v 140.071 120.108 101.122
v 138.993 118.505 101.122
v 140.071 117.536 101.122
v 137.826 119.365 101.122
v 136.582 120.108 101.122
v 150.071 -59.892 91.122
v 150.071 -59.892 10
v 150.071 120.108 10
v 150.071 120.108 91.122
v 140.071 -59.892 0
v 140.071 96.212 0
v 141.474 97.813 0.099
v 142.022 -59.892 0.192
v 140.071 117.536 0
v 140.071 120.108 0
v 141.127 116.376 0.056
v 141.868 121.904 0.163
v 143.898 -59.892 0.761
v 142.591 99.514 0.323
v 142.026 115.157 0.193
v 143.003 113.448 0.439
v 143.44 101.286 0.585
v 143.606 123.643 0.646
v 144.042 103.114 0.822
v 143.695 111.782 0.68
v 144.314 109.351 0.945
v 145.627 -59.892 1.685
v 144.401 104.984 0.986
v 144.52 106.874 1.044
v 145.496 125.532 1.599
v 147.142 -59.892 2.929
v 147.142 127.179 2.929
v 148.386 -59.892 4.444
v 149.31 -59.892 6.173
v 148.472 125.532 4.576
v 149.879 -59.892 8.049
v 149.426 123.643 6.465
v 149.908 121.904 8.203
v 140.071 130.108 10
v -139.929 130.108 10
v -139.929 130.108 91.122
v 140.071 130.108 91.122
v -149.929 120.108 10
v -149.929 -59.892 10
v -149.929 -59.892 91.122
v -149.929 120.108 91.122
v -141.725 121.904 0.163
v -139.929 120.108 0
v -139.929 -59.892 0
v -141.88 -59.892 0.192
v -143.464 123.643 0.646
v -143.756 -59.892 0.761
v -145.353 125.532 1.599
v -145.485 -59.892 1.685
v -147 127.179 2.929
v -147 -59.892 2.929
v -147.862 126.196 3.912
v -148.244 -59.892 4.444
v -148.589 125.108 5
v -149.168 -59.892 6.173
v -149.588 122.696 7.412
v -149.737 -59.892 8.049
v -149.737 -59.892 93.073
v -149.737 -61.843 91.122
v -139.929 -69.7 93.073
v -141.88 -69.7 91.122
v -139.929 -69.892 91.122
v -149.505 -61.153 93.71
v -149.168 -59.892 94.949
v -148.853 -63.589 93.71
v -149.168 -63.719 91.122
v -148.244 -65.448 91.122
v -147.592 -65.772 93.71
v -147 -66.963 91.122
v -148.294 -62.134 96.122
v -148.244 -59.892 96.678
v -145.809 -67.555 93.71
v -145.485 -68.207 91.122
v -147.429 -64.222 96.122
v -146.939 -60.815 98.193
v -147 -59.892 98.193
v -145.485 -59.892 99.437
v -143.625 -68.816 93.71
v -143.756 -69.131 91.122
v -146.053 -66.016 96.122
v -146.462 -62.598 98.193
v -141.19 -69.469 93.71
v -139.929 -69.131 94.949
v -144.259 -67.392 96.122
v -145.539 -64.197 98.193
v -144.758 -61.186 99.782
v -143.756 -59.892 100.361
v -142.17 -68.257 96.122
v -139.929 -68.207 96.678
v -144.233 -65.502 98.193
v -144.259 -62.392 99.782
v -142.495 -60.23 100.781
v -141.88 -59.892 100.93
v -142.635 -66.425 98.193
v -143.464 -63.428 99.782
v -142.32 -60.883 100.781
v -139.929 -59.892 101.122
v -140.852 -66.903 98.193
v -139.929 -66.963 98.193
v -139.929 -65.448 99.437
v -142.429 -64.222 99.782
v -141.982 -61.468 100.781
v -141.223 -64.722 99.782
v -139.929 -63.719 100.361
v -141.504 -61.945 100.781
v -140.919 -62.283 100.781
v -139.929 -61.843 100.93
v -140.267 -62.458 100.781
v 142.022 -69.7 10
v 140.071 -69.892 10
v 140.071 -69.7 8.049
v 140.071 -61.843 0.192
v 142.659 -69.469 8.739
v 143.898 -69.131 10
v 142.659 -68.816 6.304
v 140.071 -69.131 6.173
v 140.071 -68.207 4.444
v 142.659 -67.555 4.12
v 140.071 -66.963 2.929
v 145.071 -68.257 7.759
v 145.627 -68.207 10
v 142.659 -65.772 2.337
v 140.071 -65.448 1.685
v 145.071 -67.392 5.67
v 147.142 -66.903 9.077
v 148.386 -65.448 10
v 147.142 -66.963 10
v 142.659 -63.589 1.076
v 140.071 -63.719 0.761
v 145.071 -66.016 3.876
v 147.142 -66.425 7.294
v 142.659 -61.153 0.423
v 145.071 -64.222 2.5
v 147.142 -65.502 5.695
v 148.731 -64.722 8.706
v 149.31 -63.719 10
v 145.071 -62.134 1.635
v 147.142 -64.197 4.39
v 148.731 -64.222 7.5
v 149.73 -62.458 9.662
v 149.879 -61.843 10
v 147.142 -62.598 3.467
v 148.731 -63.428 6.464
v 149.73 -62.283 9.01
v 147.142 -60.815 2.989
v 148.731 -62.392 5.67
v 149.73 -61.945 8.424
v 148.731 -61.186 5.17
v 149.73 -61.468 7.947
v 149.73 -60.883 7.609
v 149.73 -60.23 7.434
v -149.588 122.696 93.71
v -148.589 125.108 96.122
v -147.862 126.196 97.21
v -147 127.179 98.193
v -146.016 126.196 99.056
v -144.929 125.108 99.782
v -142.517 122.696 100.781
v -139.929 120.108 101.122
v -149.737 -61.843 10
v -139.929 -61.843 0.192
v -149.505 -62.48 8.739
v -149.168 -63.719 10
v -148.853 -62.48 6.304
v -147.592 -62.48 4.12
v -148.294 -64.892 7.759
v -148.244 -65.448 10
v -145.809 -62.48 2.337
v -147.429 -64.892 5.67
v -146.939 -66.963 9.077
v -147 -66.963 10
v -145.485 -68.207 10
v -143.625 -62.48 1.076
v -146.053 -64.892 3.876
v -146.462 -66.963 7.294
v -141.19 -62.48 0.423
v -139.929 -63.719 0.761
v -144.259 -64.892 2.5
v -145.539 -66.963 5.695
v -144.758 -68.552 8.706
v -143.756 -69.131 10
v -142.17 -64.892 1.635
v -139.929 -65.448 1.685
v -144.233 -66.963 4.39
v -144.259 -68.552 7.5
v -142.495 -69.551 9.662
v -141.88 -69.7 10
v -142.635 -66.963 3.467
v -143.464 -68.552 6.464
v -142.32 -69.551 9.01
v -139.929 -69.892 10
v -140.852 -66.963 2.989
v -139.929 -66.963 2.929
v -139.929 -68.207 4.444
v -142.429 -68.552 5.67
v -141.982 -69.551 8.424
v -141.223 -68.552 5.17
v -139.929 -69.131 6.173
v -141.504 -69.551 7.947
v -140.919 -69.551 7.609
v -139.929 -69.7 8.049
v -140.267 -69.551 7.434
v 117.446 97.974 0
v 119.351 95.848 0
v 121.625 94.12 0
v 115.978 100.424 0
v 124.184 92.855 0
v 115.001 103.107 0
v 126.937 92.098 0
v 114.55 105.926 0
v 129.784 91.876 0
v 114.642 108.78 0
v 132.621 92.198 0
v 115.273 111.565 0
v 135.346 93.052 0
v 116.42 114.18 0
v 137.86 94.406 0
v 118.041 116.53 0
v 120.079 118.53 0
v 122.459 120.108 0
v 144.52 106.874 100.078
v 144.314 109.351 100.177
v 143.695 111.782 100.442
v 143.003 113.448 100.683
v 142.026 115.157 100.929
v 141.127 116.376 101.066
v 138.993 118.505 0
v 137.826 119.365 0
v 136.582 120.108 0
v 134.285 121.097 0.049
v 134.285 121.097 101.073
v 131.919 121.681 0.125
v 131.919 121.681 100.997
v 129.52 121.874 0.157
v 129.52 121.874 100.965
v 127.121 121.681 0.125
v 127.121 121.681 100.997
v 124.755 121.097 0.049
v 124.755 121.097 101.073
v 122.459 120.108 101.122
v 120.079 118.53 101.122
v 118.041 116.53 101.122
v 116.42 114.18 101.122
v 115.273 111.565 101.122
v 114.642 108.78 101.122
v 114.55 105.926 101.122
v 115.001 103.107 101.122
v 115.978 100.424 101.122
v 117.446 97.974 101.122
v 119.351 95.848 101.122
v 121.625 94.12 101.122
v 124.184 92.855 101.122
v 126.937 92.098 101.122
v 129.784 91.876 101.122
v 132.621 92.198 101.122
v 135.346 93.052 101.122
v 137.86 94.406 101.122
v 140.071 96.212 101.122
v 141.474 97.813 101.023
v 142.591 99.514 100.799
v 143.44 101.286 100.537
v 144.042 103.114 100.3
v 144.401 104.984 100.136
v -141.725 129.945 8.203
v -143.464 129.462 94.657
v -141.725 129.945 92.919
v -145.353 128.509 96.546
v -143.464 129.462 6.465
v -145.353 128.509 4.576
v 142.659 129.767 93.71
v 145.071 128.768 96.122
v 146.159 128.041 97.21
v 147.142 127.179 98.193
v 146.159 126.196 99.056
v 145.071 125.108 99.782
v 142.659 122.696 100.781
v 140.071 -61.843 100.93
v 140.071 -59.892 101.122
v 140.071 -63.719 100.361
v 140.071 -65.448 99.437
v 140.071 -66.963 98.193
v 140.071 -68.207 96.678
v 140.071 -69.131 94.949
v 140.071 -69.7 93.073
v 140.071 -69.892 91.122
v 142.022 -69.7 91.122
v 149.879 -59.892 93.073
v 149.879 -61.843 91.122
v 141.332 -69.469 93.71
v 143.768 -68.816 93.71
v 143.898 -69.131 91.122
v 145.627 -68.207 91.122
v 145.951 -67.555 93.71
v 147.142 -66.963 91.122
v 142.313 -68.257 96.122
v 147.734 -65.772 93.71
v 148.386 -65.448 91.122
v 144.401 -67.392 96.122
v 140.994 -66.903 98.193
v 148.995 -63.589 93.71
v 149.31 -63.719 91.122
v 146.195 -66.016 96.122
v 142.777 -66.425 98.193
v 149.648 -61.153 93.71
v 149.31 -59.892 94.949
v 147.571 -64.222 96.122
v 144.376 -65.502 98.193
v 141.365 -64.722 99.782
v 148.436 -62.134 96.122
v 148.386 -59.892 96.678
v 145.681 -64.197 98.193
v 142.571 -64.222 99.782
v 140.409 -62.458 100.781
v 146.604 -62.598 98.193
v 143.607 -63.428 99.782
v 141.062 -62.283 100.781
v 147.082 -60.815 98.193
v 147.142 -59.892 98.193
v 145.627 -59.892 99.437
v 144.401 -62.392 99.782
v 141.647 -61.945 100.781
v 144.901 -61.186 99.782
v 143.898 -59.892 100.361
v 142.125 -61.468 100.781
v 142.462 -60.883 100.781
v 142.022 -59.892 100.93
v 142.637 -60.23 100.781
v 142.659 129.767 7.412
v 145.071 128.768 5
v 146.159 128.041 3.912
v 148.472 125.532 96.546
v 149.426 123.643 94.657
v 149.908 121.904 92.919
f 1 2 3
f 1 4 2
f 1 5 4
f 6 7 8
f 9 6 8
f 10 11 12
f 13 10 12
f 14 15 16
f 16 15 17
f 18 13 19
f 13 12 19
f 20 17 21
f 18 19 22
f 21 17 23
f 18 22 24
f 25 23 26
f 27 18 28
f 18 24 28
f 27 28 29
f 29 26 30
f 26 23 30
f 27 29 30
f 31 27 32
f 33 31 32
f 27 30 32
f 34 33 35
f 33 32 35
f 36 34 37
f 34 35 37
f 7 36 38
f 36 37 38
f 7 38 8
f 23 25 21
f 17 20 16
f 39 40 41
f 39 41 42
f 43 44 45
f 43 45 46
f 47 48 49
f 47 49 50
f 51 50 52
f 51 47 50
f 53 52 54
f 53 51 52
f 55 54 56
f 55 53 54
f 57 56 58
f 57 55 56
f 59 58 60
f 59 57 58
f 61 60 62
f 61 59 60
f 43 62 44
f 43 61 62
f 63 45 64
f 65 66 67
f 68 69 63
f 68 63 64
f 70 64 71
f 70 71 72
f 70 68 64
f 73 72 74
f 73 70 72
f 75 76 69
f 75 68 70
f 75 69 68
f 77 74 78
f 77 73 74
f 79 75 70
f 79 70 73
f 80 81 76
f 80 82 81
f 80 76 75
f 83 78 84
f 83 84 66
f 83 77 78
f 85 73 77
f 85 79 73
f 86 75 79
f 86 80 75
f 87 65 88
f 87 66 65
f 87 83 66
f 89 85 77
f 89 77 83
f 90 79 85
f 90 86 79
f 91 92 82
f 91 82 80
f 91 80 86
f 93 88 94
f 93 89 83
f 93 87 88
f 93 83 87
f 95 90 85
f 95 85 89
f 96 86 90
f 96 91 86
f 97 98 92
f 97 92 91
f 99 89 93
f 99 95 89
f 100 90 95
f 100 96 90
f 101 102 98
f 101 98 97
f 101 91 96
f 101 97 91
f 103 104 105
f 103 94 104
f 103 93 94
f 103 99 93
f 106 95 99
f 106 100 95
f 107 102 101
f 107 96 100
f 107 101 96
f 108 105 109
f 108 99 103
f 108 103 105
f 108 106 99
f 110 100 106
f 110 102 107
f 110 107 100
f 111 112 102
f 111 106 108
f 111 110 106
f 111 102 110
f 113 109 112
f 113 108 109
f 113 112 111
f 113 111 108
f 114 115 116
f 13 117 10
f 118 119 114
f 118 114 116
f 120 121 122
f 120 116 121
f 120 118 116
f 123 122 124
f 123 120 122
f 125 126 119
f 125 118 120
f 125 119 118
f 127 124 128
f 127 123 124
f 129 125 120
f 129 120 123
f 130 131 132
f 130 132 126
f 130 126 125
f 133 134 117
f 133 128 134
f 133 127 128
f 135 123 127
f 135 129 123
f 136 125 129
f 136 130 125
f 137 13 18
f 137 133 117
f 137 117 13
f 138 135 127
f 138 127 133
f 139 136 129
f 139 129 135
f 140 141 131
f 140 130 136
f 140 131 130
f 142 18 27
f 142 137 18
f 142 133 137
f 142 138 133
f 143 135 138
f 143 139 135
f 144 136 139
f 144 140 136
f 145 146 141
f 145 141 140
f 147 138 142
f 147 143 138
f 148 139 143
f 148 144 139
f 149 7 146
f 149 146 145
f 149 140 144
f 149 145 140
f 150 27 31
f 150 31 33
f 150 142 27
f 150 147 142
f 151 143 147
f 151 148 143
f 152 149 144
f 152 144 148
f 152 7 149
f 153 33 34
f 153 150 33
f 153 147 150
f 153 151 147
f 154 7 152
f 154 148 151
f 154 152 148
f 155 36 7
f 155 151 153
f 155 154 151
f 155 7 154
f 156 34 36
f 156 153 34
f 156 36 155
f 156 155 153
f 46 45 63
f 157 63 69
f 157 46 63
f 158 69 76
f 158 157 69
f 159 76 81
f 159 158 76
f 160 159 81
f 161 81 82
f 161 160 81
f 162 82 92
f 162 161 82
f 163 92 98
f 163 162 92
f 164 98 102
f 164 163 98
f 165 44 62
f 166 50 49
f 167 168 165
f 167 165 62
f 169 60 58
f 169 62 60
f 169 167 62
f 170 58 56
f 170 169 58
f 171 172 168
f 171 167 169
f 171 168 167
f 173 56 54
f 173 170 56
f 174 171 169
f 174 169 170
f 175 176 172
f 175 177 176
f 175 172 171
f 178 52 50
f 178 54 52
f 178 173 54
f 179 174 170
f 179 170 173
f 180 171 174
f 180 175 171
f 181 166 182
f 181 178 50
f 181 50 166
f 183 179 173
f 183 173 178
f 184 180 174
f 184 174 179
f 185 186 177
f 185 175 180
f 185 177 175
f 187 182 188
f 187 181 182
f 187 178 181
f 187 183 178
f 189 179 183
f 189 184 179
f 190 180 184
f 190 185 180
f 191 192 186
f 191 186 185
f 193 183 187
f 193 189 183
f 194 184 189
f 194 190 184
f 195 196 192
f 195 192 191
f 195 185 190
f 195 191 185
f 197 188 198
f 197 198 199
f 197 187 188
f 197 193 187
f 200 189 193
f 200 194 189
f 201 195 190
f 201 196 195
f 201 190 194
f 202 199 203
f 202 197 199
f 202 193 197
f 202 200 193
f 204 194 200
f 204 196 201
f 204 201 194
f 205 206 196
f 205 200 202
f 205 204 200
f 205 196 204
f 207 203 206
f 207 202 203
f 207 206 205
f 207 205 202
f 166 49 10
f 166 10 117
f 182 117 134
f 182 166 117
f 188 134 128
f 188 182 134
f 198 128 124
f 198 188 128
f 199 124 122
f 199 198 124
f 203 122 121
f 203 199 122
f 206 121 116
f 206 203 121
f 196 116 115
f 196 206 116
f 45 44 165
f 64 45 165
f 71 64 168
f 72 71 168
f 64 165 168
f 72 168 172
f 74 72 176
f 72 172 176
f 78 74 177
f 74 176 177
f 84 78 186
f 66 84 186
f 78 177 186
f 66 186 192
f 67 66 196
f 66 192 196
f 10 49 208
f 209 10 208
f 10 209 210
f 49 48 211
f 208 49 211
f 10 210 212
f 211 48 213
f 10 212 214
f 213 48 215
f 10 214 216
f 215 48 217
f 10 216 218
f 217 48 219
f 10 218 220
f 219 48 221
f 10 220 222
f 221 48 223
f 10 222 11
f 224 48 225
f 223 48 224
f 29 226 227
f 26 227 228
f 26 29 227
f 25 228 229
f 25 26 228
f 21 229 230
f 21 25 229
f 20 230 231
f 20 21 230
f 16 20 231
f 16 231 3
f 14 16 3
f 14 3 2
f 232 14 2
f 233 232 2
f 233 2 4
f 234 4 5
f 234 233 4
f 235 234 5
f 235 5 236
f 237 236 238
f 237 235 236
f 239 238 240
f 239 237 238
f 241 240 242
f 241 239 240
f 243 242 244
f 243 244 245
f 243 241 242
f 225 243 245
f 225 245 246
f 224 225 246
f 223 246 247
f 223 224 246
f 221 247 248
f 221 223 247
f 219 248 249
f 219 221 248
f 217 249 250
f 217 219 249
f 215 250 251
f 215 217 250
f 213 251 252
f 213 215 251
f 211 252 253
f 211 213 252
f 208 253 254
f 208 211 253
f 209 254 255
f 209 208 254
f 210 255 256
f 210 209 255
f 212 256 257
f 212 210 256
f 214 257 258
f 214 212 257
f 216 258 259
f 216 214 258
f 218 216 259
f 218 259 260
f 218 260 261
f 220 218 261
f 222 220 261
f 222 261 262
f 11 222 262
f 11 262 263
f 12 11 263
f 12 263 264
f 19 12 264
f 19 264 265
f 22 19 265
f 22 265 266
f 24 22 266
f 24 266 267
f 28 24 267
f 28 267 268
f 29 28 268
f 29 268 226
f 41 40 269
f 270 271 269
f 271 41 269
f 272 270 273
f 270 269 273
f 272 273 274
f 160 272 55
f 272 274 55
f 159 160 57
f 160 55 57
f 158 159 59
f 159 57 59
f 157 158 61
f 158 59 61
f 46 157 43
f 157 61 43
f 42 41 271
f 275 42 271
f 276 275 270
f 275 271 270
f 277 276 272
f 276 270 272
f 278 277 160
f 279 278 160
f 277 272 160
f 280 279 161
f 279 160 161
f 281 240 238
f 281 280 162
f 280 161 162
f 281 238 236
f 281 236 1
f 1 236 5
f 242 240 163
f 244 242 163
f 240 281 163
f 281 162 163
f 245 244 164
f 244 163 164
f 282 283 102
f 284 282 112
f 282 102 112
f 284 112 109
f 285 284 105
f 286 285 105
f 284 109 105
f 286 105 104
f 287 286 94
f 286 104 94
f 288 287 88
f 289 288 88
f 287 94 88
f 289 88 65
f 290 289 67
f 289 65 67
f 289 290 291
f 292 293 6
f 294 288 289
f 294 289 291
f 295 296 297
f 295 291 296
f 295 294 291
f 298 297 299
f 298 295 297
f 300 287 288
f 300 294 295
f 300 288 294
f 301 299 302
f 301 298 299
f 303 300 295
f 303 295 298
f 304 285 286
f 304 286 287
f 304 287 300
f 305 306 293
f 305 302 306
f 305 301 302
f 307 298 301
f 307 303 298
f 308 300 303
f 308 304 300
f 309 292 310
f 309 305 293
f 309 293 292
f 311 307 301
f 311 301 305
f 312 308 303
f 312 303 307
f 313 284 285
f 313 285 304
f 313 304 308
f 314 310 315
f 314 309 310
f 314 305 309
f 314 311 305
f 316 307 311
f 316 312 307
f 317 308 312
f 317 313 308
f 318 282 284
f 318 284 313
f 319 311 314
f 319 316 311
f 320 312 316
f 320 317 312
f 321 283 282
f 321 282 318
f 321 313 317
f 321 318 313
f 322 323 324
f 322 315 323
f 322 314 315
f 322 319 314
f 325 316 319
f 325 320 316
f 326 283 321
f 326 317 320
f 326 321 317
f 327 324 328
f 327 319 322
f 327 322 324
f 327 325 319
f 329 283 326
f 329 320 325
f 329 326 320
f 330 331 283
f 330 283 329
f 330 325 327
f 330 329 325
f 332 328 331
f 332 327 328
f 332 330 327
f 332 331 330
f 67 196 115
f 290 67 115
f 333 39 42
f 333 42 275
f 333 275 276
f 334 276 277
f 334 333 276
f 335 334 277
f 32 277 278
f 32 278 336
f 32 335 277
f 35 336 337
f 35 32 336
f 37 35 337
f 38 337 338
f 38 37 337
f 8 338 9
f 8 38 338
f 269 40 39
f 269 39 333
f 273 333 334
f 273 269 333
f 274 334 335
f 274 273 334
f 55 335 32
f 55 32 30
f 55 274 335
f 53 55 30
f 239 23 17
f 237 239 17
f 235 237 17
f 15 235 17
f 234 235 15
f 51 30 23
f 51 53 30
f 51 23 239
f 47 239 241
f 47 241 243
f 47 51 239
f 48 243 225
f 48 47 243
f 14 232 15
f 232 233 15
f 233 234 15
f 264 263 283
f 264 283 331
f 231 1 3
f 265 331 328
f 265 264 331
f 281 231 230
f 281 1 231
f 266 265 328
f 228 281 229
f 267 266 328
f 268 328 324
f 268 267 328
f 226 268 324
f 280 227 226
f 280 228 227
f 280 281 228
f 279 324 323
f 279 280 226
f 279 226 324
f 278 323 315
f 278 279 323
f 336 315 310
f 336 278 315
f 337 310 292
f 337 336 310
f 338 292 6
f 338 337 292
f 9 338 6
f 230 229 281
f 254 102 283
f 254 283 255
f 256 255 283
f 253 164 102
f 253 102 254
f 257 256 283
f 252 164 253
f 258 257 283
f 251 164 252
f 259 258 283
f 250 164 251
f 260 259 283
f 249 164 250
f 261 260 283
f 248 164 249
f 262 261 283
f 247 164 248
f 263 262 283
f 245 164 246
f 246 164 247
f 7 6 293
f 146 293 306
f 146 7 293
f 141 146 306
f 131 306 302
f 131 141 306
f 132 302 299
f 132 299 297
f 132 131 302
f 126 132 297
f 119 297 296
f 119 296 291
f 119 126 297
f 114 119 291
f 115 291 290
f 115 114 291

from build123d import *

# Parameters (mm, degrees)
F0_W         = 300
F0_H         = 200
F0_R         = 15
F1_DEPTH     = 101.12201
F2_T1_DEPTH  = 151.12201
F2_T3_DEPTH  = 350
F3_T1_DEPTH  = 205
F3_T3_DEPTH  = 280
F3_T5_DEPTH  = 81.12201
F3_S9_W      = 10.2
F3_S9_H      = 10.2
F3_T10_DEPTH = 10.2
F3_S15_W     = 10.2
F3_S15_H     = 10.2
F3_T16_DEPTH = 10.2
F3_S21_W     = 10.2
F3_S21_H     = 10.2
F3_T22_DEPTH = 10.2
F3_S27_W     = 10.2
F3_S27_H     = 10.2
F3_T28_DEPTH = 10.2


# Not quite as in the source:
# - a fillet or chamfer that OpenCascade refuses, or shapes differently, is made with other operations: its cross-section is extruded or revolved along the edge and cut away or added


with BuildPart() as f1:
    # F0 (on Top) → F1 (new body)
    with BuildSketch(Plane.XY):
        with Locations((0.0711865723, 30.1078906848)):
            Rectangle(F0_W, F0_H)
        with Locations((129.520341754, 106.8741083145)):
            Circle(F0_R, mode=Mode.SUBTRACT)
    extrude(amount=F1_DEPTH)

    # F2: fillet of radius 10 on 4 edges, made by hand

    # F2_s2 → F2_t1 (cut)
    with BuildSketch(Plane.XY.offset(-25)):
        with BuildLine():
            ThreePointArc((-139.9288134277, 130.1078906848), (-146.9998812396, 127.1789584967), (-149.9288134277, 120.1078906848))
            Line((-149.9288134277, 120.1078906848), (-149.9288134277, 130.1078906848))
            Line((-149.9288134277, 130.1078906848), (-139.9288134277, 130.1078906848))
        make_face()
        with BuildLine():
            ThreePointArc((140.0711865723, 130.1078906848), (147.1422543842, 127.1789584967), (150.0711865723, 120.1078906848))
            Line((150.0711865723, 120.1078906848), (150.0711865723, 130.1078906848))
            Line((150.0711865723, 130.1078906848), (140.0711865723, 130.1078906848))
        make_face()
    extrude(amount=F2_T1_DEPTH, mode=Mode.SUBTRACT)

    # F2_s4 → F2_t3 (cut)
    with BuildSketch(Plane.YZ.offset(-174.9288134277)):
        with BuildLine():
            ThreePointArc((130.1078906848, 10), (127.1789584967, 2.9289321881), (120.1078906848, 0))
            Line((120.1078906848, 0), (130.1078906848, 0))
            Line((130.1078906848, 0), (130.1078906848, 10))
        make_face()
        with BuildLine():
            ThreePointArc((130.1078906848, 91.12201), (127.1789584967, 98.1930778119), (120.1078906848, 101.12201))
            Line((120.1078906848, 101.12201), (130.1078906848, 101.12201))
            Line((130.1078906848, 101.12201), (130.1078906848, 91.12201))
        make_face()
    extrude(amount=F2_T3_DEPTH, mode=Mode.SUBTRACT)

    # F3: fillet of radius 10 on 13 edges, made by hand

    # F3_s2 → F3_t1 (cut)
    with BuildSketch(Plane.XZ.offset(-145.1078906848)):
        with BuildLine():
            ThreePointArc((-139.9288134277, 0), (-146.9998812396, 2.9289321881), (-149.9288134277, 10))
            Line((-149.9288134277, 10), (-149.9288134277, 0))
            Line((-149.9288134277, 0), (-139.9288134277, 0))
        make_face()
        with BuildLine():
            ThreePointArc((140.0711865723, 0), (147.1422543842, 2.9289321881), (150.0711865723, 10))
            Line((150.0711865723, 10), (150.0711865723, 0))
            Line((150.0711865723, 0), (140.0711865723, 0))
        make_face()
        with BuildLine():
            ThreePointArc((140.0711865723, 101.12201), (147.1422543842, 98.1930778119), (150.0711865723, 91.12201))
            Line((150.0711865723, 91.12201), (150.0711865723, 101.12201))
            Line((150.0711865723, 101.12201), (140.0711865723, 101.12201))
        make_face()
        with BuildLine():
            ThreePointArc((-149.9288134277, 91.12201), (-146.9998812396, 98.1930778119), (-139.9288134277, 101.12201))
            Line((-139.9288134277, 101.12201), (-149.9288134277, 101.12201))
            Line((-149.9288134277, 101.12201), (-149.9288134277, 91.12201))
        make_face()
    extrude(amount=F3_T1_DEPTH, mode=Mode.SUBTRACT)

    # F3_s4 → F3_t3 (cut)
    with BuildSketch(Plane.YZ.offset(-139.9288134277)):
        with BuildLine():
            ThreePointArc((-59.8921093152, 0), (-66.963177127, 2.9289321881), (-69.8921093152, 10))
            Line((-69.8921093152, 10), (-69.8921093152, 0))
            Line((-69.8921093152, 0), (-59.8921093152, 0))
        make_face()
        with BuildLine():
            ThreePointArc((-59.8921093152, 101.12201), (-66.963177127, 98.1930778119), (-69.8921093152, 91.12201))
            Line((-69.8921093152, 91.12201), (-69.8921093152, 101.12201))
            Line((-69.8921093152, 101.12201), (-59.8921093152, 101.12201))
        make_face()
    extrude(amount=F3_T3_DEPTH, mode=Mode.SUBTRACT)

    # F3_s6 → F3_t5 (cut)
    with BuildSketch(Plane.XY.offset(10)):
        with BuildLine():
            ThreePointArc((-149.9288134277, -59.8921093152), (-146.9998812396, -66.963177127), (-139.9288134277, -69.8921093152))
            Line((-139.9288134277, -69.8921093152), (-149.9288134277, -69.8921093152))
            Line((-149.9288134277, -69.8921093152), (-149.9288134277, -59.8921093152))
        make_face()
        with BuildLine():
            ThreePointArc((150.0711865723, -59.8921093152), (147.1422543842, -66.963177127), (140.0711865723, -69.8921093152))
            Line((140.0711865723, -69.8921093152), (150.0711865723, -69.8921093152))
            Line((150.0711865723, -69.8921093152), (150.0711865723, -59.8921093152))
        make_face()
    extrude(amount=F3_T5_DEPTH, mode=Mode.SUBTRACT)


with BuildPart() as f3_tool8:
    # F3_s9 → F3_t10 (new body)
    with BuildSketch(Plane.XZ.offset(59.8921093152)):
        with Locations((-145.0288134277, 4.9)):
            Rectangle(F3_S9_W, F3_S9_H)
    extrude(amount=F3_T10_DEPTH)

    # F3_s11 → F3_t12 (revolve, cut)
    with BuildSketch(Plane(origin=(-139.9288134277, -59.8921093152, 10), x_dir=(0.7071067812, 0, 0.7071067812), z_dir=(0.7071067812, 0, -0.7071067812))):
        with BuildLine():
            ThreePointArc((0, -10), (10, 0), (0, 10))
            Line((0, 10), (0, -10))
        make_face()
    revolve(axis=Axis((-139.9288134277, -59.8921093152, 10), (0, -1, 0)), mode=Mode.SUBTRACT)


with BuildPart() as f1_1:
    add(f1.part)

    # F3_t7: cut F3_tool8
    add(f3_tool8.part, mode=Mode.SUBTRACT)


with BuildPart() as f3_tool14:
    # F3_s15 → F3_t16 (new body)
    with BuildSketch(Plane.YZ.offset(140.0711865723)):
        with Locations((-64.9921093152, 4.9)):
            Rectangle(F3_S15_W, F3_S15_H)
    extrude(amount=F3_T16_DEPTH)

    # F3_s17 → F3_t18 (revolve, cut)
    with BuildSketch(Plane(origin=(140.0711865723, -59.8921093152, 10), x_dir=(0, 0.7071067812, 0.7071067812), z_dir=(0, 0.7071067812, -0.7071067812))):
        with BuildLine():
            ThreePointArc((0, -10), (10, 0), (0, 10))
            Line((0, 10), (0, -10))
        make_face()
    revolve(axis=Axis((140.0711865723, -59.8921093152, 10), (1, 0, 0)), mode=Mode.SUBTRACT)


with BuildPart() as f1_2:
    add(f1_1.part)

    # F3_t13: cut F3_tool14
    add(f3_tool14.part, mode=Mode.SUBTRACT)


with BuildPart() as f3_tool20:
    # F3_s21 → F3_t22 (new body)
    with BuildSketch(Plane.XY.offset(91.12201)):
        with Locations((-145.0288134277, -64.9921093152)):
            Rectangle(F3_S21_W, F3_S21_H)
    extrude(amount=F3_T22_DEPTH)

    # F3_s23 → F3_t24 (revolve, cut)
    with BuildSketch(Plane(origin=(-139.9288134277, -59.8921093152, 91.12201), x_dir=(0.7071067812, 0.7071067812, 0), z_dir=(0.7071067812, -0.7071067812, 0))):
        with BuildLine():
            ThreePointArc((0, -10), (10, 0), (0, 10))
            Line((0, 10), (0, -10))
        make_face()
    revolve(axis=Axis((-139.9288134277, -59.8921093152, 91.12201), (0, 0, 1)), mode=Mode.SUBTRACT)


with BuildPart() as f1_3:
    add(f1_2.part)

    # F3_t19: cut F3_tool20
    add(f3_tool20.part, mode=Mode.SUBTRACT)


with BuildPart() as f3_tool26:
    # F3_s27 → F3_t28 (new body)
    with BuildSketch(Plane.XY.offset(91.12201)):
        with Locations((145.1711865723, -64.9921093152)):
            Rectangle(F3_S27_W, F3_S27_H)
    extrude(amount=F3_T28_DEPTH)

    # F3_s29 → F3_t30 (revolve, cut)
    with BuildSketch(Plane(origin=(140.0711865723, -59.8921093152, 91.12201), x_dir=(-0.7071067812, 0.7071067812, 0), z_dir=(0.7071067812, 0.7071067812, 0))):
        with BuildLine():
            ThreePointArc((0, -10), (10, 0), (0, 10))
            Line((0, 10), (0, -10))
        make_face()
    revolve(axis=Axis((140.0711865723, -59.8921093152, 91.12201), (0, 0, 1)), mode=Mode.SUBTRACT)


with BuildPart() as f1_4:
    add(f1_3.part)

    # F3_t25: cut F3_tool26
    add(f3_tool26.part, mode=Mode.SUBTRACT)


solid = f1_4.part
